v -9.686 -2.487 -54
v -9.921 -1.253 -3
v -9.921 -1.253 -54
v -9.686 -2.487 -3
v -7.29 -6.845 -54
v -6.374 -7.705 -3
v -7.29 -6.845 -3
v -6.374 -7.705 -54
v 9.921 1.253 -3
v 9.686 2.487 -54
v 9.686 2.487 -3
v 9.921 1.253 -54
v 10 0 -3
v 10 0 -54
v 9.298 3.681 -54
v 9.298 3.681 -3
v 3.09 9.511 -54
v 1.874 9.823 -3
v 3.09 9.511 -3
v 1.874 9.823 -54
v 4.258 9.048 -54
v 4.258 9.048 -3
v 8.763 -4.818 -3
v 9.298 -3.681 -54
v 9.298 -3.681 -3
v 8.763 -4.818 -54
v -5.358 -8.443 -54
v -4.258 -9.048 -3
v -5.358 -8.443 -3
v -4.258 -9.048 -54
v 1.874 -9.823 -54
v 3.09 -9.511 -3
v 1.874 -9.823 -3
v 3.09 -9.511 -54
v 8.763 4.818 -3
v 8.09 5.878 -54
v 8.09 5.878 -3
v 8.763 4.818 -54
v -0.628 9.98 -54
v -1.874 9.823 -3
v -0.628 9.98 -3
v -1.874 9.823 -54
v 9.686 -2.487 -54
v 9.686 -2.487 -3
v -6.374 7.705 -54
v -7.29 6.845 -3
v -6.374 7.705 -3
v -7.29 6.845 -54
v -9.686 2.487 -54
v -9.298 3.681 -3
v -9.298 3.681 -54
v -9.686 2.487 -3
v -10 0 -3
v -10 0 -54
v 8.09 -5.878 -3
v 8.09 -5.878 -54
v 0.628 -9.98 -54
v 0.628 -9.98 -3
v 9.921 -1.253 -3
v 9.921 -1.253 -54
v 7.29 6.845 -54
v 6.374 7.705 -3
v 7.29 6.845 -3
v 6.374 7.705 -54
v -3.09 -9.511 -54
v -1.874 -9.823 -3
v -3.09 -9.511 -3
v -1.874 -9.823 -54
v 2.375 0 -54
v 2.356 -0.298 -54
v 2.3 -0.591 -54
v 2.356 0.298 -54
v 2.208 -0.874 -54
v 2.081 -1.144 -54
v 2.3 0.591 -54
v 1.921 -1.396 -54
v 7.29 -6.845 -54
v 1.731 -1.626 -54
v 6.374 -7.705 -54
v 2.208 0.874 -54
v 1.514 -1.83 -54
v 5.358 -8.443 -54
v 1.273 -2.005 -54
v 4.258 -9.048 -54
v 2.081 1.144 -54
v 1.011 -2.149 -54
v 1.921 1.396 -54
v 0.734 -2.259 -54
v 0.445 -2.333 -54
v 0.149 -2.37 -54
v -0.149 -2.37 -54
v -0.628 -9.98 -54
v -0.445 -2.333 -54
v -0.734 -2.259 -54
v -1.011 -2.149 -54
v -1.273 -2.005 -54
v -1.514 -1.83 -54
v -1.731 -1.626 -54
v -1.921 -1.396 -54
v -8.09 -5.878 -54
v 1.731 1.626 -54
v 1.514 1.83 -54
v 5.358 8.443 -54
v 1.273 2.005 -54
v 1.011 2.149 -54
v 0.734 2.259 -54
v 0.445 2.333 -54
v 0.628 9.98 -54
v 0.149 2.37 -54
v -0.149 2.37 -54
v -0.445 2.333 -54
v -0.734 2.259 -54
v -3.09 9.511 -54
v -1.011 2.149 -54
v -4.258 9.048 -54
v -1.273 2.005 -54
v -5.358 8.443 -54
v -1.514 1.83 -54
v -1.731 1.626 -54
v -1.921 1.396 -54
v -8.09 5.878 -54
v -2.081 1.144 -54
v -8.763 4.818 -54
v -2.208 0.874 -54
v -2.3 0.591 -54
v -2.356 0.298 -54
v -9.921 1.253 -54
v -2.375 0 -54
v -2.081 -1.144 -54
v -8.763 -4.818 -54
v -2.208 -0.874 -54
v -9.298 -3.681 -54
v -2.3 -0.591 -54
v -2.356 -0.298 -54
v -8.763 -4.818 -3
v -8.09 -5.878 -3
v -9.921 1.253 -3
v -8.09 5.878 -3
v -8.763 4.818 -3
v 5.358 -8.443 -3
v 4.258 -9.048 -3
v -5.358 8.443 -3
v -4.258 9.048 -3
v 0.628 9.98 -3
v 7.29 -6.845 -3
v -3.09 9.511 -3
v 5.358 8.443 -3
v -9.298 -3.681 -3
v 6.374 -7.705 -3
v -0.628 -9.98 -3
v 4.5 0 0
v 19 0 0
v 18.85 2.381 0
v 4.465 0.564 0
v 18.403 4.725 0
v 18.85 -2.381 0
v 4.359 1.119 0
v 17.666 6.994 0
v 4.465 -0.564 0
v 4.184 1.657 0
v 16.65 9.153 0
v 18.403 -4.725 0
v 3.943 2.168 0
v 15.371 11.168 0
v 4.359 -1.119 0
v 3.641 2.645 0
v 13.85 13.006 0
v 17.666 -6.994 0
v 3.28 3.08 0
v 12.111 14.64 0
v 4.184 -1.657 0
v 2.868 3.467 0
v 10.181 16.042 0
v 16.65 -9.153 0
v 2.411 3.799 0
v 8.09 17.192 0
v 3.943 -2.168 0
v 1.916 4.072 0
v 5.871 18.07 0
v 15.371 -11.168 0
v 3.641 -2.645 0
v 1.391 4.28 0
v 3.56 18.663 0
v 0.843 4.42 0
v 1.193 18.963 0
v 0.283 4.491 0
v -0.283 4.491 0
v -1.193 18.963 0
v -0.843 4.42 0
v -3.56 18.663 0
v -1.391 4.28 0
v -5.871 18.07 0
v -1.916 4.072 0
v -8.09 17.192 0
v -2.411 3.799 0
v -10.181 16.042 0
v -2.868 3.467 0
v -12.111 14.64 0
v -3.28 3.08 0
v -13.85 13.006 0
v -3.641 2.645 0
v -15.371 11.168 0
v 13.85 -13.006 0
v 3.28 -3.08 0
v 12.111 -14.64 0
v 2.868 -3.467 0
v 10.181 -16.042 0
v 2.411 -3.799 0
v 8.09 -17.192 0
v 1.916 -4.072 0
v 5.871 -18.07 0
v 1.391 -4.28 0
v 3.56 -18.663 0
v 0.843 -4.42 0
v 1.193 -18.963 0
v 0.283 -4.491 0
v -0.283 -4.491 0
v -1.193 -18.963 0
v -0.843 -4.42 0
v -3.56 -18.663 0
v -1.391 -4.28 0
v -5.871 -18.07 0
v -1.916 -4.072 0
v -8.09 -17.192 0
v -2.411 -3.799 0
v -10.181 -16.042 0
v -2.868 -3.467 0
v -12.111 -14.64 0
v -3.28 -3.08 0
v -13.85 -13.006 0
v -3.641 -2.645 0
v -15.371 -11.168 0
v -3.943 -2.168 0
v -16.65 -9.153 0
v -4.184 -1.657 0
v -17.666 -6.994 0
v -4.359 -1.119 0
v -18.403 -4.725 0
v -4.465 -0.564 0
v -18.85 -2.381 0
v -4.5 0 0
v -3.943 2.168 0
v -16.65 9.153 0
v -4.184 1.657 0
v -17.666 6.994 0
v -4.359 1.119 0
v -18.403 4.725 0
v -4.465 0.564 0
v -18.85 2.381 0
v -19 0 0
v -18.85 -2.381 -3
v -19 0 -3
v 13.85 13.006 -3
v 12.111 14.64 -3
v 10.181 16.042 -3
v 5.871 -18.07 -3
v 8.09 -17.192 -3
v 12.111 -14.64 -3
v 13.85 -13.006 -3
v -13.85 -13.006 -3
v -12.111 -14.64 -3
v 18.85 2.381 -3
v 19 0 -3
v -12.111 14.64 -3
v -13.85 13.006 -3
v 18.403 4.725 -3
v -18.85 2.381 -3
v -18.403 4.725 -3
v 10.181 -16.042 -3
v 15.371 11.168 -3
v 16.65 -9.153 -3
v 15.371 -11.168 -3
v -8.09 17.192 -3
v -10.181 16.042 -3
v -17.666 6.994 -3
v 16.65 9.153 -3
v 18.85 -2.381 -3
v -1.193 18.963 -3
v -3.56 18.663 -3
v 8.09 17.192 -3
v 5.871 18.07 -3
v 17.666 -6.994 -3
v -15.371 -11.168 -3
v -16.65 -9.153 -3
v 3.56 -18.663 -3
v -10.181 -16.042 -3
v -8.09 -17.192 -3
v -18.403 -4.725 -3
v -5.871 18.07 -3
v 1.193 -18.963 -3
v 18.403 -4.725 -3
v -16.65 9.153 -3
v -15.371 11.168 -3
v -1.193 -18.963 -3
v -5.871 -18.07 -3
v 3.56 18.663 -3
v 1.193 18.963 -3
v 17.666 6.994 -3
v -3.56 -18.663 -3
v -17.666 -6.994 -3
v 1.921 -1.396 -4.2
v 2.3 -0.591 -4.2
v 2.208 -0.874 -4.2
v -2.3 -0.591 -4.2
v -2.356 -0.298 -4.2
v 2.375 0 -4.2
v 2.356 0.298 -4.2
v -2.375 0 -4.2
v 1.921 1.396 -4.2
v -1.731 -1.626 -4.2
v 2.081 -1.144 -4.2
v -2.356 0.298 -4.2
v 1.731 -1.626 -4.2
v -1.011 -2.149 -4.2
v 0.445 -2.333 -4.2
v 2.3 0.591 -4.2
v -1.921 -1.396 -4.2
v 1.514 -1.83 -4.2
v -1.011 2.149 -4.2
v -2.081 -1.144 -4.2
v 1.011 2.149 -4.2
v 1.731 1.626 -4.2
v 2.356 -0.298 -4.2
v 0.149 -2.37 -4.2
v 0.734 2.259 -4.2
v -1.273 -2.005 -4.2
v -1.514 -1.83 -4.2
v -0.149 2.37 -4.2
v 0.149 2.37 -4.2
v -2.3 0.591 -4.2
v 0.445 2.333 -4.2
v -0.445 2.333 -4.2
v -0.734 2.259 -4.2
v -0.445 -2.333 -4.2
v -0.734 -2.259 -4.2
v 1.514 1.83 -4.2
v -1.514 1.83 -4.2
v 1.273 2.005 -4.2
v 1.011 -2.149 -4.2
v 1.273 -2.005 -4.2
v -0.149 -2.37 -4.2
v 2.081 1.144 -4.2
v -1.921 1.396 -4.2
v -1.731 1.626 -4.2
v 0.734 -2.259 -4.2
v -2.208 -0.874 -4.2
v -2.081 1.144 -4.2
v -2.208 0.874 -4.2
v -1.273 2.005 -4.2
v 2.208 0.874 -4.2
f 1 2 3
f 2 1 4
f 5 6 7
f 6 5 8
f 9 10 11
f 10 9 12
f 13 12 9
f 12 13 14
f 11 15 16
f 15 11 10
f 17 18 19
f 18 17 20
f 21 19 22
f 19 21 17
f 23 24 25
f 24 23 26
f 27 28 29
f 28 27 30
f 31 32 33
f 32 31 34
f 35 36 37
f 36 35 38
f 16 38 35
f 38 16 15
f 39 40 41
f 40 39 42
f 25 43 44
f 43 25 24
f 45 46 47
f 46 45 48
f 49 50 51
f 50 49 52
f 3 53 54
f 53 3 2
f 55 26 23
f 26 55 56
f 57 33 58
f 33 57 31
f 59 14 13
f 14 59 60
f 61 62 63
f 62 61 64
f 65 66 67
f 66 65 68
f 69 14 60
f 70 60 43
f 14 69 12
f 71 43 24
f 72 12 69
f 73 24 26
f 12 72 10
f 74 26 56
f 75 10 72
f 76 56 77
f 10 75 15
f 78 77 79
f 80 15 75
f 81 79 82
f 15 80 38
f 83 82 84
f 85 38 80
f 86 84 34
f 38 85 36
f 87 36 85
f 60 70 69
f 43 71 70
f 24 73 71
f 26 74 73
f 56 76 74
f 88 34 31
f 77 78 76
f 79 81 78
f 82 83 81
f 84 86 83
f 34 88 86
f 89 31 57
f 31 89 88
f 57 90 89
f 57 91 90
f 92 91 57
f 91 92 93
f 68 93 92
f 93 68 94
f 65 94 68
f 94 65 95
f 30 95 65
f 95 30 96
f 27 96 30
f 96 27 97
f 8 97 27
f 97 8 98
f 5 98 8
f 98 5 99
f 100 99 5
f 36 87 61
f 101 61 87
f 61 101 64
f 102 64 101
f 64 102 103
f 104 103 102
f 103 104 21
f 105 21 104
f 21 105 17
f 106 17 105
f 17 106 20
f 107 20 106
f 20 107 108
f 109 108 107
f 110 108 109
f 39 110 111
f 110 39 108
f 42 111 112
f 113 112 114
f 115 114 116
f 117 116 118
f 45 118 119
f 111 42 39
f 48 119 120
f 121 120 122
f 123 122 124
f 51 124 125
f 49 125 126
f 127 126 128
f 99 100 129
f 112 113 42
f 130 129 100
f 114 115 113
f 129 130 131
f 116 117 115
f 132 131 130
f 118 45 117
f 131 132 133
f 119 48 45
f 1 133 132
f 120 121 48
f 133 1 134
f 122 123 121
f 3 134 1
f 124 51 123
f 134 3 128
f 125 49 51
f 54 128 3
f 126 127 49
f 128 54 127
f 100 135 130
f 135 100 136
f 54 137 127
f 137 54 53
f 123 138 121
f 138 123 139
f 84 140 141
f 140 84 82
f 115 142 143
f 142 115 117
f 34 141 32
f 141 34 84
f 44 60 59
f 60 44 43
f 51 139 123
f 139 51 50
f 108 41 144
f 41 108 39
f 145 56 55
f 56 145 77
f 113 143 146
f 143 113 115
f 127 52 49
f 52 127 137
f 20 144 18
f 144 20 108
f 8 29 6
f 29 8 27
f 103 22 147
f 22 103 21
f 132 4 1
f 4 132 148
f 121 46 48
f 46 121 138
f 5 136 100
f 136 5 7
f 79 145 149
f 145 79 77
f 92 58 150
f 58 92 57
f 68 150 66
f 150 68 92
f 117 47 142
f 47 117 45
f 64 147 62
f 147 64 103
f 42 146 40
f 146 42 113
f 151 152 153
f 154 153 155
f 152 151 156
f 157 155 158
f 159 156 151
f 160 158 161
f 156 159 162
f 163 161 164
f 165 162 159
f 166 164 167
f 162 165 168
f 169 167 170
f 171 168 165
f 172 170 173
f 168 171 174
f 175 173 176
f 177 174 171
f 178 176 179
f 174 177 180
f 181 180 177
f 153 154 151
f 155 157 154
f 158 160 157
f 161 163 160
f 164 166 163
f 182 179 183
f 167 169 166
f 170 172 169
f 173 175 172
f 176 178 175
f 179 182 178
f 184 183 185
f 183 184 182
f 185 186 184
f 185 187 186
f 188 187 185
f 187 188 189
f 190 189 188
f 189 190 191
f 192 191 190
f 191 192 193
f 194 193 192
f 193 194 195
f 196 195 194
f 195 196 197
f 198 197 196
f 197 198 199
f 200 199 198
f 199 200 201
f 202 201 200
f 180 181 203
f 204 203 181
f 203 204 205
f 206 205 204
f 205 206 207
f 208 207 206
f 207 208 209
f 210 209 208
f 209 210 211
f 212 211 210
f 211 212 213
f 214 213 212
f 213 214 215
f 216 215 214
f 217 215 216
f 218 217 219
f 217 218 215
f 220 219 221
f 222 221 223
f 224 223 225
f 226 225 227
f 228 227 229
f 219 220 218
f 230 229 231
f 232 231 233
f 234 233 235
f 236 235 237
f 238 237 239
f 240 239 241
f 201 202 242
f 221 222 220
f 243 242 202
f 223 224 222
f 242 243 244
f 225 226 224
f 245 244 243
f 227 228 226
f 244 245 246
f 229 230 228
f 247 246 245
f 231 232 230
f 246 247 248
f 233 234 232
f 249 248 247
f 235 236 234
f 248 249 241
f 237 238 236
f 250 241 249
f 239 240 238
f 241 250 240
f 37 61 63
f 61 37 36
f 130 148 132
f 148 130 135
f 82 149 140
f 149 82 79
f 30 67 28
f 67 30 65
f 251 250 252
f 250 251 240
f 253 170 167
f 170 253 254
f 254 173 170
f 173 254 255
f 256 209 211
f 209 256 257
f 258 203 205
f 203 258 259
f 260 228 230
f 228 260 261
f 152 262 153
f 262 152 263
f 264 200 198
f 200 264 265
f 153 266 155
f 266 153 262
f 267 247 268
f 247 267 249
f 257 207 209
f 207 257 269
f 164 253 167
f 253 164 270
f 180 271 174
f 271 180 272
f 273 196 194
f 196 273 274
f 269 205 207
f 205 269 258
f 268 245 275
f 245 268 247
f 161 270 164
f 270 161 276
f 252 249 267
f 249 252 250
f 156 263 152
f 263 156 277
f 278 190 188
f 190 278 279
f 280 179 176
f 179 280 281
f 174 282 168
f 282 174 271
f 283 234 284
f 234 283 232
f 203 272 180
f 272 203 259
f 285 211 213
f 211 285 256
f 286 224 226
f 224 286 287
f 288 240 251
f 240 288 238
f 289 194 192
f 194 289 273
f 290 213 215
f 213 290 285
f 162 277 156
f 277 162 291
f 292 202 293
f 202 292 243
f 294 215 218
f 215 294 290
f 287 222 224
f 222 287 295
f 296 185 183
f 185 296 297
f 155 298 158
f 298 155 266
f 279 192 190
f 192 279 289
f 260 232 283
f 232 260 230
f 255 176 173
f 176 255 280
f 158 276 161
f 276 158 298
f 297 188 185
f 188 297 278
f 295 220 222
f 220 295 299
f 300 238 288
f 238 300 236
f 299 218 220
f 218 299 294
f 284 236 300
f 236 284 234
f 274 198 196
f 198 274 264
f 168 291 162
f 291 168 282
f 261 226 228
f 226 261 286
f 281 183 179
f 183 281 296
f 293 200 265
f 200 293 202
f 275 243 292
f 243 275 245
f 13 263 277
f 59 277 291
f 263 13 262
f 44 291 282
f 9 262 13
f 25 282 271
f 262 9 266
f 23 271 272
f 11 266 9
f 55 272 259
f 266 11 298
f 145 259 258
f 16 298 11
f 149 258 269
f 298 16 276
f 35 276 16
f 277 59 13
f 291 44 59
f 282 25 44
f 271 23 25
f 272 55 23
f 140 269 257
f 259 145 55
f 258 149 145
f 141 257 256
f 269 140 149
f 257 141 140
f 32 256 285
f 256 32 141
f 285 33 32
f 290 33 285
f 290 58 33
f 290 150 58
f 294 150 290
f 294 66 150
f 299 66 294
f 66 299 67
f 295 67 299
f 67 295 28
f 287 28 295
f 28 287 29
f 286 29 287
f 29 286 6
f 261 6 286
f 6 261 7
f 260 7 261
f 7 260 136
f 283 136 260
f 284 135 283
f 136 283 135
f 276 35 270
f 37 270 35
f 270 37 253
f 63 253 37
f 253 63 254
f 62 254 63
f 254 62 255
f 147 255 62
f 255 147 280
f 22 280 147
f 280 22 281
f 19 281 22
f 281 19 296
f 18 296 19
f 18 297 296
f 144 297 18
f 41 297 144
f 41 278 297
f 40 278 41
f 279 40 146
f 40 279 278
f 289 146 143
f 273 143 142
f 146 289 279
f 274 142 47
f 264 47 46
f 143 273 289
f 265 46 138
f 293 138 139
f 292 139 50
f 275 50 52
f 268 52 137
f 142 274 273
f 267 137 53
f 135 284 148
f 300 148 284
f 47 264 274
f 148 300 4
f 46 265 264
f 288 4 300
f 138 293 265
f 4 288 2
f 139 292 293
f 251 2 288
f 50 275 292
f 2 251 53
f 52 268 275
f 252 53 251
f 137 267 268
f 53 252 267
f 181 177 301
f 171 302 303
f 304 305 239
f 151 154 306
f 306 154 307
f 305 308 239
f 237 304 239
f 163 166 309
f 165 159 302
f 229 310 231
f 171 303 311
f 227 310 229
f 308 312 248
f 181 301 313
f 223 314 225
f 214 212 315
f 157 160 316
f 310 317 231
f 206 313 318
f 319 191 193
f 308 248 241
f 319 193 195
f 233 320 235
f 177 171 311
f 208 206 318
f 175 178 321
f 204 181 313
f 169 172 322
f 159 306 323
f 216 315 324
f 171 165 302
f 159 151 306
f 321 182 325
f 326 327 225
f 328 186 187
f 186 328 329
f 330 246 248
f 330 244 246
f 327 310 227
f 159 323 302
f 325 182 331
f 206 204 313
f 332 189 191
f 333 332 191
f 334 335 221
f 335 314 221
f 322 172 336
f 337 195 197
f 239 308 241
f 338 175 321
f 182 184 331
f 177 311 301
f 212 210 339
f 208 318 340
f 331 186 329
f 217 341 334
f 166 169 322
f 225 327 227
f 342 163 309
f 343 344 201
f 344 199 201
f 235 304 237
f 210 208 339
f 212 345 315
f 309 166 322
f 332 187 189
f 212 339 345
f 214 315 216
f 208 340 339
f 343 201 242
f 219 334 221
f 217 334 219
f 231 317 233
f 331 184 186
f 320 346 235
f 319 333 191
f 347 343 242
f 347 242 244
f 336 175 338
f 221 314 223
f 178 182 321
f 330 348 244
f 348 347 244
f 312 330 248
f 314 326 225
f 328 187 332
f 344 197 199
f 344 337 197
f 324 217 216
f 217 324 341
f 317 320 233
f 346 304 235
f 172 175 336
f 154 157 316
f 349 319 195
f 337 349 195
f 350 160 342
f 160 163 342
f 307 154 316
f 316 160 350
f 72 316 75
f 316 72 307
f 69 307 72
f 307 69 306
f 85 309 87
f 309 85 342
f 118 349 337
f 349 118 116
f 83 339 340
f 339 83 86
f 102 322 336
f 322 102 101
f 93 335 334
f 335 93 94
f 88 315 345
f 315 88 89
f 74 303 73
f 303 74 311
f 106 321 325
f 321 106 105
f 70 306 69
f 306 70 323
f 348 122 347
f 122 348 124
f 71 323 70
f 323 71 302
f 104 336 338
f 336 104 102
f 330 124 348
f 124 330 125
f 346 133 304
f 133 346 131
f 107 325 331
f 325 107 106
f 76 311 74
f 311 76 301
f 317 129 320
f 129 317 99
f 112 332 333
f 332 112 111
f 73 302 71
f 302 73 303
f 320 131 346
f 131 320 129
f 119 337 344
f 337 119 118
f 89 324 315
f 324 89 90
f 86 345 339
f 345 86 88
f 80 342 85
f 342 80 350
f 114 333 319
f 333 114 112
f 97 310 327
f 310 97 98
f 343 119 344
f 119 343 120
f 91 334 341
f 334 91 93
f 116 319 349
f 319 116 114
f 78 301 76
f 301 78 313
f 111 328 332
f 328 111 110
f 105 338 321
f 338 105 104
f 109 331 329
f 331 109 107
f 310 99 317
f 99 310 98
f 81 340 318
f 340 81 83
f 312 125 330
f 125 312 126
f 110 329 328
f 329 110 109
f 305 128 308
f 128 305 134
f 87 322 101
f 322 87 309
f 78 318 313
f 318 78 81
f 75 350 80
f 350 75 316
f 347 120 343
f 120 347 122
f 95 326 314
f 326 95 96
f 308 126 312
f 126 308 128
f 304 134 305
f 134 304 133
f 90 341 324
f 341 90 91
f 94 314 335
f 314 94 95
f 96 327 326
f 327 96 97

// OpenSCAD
$fn = 50;


difference() {
	union() {
		translate(v = [0, 0, -54.0000000000]) {
			cylinder(h = 54, r = 10.0000000000);
		}
		translate(v = [0, 0, -3.0000000000]) {
			cylinder(h = 3, r = 19.0000000000);
		}
	}
	union() {
		translate(v = [0, 0, 0]) {
			rotate(a = [0, 0, 0]) {
				difference() {
					union() {
						#translate(v = [0, 0, -54.0000000000]) {
							cylinder(h = 54, r = 2.2500000000);
						}
						#translate(v = [0, 0, -4.2000000000]) {
							cylinder(h = 4.2000000000, r1 = 2.3750000000, r2 = 4.5000000000);
						}
						#translate(v = [0, 0, -54.0000000000]) {
							cylinder(h = 54, r = 2.3750000000);
						}
						#translate(v = [0, 0, -54.0000000000]) {
							cylinder(h = 54, r = 2.2500000000);
						}
					}
					union();
				}
			}
		}
	}
}
